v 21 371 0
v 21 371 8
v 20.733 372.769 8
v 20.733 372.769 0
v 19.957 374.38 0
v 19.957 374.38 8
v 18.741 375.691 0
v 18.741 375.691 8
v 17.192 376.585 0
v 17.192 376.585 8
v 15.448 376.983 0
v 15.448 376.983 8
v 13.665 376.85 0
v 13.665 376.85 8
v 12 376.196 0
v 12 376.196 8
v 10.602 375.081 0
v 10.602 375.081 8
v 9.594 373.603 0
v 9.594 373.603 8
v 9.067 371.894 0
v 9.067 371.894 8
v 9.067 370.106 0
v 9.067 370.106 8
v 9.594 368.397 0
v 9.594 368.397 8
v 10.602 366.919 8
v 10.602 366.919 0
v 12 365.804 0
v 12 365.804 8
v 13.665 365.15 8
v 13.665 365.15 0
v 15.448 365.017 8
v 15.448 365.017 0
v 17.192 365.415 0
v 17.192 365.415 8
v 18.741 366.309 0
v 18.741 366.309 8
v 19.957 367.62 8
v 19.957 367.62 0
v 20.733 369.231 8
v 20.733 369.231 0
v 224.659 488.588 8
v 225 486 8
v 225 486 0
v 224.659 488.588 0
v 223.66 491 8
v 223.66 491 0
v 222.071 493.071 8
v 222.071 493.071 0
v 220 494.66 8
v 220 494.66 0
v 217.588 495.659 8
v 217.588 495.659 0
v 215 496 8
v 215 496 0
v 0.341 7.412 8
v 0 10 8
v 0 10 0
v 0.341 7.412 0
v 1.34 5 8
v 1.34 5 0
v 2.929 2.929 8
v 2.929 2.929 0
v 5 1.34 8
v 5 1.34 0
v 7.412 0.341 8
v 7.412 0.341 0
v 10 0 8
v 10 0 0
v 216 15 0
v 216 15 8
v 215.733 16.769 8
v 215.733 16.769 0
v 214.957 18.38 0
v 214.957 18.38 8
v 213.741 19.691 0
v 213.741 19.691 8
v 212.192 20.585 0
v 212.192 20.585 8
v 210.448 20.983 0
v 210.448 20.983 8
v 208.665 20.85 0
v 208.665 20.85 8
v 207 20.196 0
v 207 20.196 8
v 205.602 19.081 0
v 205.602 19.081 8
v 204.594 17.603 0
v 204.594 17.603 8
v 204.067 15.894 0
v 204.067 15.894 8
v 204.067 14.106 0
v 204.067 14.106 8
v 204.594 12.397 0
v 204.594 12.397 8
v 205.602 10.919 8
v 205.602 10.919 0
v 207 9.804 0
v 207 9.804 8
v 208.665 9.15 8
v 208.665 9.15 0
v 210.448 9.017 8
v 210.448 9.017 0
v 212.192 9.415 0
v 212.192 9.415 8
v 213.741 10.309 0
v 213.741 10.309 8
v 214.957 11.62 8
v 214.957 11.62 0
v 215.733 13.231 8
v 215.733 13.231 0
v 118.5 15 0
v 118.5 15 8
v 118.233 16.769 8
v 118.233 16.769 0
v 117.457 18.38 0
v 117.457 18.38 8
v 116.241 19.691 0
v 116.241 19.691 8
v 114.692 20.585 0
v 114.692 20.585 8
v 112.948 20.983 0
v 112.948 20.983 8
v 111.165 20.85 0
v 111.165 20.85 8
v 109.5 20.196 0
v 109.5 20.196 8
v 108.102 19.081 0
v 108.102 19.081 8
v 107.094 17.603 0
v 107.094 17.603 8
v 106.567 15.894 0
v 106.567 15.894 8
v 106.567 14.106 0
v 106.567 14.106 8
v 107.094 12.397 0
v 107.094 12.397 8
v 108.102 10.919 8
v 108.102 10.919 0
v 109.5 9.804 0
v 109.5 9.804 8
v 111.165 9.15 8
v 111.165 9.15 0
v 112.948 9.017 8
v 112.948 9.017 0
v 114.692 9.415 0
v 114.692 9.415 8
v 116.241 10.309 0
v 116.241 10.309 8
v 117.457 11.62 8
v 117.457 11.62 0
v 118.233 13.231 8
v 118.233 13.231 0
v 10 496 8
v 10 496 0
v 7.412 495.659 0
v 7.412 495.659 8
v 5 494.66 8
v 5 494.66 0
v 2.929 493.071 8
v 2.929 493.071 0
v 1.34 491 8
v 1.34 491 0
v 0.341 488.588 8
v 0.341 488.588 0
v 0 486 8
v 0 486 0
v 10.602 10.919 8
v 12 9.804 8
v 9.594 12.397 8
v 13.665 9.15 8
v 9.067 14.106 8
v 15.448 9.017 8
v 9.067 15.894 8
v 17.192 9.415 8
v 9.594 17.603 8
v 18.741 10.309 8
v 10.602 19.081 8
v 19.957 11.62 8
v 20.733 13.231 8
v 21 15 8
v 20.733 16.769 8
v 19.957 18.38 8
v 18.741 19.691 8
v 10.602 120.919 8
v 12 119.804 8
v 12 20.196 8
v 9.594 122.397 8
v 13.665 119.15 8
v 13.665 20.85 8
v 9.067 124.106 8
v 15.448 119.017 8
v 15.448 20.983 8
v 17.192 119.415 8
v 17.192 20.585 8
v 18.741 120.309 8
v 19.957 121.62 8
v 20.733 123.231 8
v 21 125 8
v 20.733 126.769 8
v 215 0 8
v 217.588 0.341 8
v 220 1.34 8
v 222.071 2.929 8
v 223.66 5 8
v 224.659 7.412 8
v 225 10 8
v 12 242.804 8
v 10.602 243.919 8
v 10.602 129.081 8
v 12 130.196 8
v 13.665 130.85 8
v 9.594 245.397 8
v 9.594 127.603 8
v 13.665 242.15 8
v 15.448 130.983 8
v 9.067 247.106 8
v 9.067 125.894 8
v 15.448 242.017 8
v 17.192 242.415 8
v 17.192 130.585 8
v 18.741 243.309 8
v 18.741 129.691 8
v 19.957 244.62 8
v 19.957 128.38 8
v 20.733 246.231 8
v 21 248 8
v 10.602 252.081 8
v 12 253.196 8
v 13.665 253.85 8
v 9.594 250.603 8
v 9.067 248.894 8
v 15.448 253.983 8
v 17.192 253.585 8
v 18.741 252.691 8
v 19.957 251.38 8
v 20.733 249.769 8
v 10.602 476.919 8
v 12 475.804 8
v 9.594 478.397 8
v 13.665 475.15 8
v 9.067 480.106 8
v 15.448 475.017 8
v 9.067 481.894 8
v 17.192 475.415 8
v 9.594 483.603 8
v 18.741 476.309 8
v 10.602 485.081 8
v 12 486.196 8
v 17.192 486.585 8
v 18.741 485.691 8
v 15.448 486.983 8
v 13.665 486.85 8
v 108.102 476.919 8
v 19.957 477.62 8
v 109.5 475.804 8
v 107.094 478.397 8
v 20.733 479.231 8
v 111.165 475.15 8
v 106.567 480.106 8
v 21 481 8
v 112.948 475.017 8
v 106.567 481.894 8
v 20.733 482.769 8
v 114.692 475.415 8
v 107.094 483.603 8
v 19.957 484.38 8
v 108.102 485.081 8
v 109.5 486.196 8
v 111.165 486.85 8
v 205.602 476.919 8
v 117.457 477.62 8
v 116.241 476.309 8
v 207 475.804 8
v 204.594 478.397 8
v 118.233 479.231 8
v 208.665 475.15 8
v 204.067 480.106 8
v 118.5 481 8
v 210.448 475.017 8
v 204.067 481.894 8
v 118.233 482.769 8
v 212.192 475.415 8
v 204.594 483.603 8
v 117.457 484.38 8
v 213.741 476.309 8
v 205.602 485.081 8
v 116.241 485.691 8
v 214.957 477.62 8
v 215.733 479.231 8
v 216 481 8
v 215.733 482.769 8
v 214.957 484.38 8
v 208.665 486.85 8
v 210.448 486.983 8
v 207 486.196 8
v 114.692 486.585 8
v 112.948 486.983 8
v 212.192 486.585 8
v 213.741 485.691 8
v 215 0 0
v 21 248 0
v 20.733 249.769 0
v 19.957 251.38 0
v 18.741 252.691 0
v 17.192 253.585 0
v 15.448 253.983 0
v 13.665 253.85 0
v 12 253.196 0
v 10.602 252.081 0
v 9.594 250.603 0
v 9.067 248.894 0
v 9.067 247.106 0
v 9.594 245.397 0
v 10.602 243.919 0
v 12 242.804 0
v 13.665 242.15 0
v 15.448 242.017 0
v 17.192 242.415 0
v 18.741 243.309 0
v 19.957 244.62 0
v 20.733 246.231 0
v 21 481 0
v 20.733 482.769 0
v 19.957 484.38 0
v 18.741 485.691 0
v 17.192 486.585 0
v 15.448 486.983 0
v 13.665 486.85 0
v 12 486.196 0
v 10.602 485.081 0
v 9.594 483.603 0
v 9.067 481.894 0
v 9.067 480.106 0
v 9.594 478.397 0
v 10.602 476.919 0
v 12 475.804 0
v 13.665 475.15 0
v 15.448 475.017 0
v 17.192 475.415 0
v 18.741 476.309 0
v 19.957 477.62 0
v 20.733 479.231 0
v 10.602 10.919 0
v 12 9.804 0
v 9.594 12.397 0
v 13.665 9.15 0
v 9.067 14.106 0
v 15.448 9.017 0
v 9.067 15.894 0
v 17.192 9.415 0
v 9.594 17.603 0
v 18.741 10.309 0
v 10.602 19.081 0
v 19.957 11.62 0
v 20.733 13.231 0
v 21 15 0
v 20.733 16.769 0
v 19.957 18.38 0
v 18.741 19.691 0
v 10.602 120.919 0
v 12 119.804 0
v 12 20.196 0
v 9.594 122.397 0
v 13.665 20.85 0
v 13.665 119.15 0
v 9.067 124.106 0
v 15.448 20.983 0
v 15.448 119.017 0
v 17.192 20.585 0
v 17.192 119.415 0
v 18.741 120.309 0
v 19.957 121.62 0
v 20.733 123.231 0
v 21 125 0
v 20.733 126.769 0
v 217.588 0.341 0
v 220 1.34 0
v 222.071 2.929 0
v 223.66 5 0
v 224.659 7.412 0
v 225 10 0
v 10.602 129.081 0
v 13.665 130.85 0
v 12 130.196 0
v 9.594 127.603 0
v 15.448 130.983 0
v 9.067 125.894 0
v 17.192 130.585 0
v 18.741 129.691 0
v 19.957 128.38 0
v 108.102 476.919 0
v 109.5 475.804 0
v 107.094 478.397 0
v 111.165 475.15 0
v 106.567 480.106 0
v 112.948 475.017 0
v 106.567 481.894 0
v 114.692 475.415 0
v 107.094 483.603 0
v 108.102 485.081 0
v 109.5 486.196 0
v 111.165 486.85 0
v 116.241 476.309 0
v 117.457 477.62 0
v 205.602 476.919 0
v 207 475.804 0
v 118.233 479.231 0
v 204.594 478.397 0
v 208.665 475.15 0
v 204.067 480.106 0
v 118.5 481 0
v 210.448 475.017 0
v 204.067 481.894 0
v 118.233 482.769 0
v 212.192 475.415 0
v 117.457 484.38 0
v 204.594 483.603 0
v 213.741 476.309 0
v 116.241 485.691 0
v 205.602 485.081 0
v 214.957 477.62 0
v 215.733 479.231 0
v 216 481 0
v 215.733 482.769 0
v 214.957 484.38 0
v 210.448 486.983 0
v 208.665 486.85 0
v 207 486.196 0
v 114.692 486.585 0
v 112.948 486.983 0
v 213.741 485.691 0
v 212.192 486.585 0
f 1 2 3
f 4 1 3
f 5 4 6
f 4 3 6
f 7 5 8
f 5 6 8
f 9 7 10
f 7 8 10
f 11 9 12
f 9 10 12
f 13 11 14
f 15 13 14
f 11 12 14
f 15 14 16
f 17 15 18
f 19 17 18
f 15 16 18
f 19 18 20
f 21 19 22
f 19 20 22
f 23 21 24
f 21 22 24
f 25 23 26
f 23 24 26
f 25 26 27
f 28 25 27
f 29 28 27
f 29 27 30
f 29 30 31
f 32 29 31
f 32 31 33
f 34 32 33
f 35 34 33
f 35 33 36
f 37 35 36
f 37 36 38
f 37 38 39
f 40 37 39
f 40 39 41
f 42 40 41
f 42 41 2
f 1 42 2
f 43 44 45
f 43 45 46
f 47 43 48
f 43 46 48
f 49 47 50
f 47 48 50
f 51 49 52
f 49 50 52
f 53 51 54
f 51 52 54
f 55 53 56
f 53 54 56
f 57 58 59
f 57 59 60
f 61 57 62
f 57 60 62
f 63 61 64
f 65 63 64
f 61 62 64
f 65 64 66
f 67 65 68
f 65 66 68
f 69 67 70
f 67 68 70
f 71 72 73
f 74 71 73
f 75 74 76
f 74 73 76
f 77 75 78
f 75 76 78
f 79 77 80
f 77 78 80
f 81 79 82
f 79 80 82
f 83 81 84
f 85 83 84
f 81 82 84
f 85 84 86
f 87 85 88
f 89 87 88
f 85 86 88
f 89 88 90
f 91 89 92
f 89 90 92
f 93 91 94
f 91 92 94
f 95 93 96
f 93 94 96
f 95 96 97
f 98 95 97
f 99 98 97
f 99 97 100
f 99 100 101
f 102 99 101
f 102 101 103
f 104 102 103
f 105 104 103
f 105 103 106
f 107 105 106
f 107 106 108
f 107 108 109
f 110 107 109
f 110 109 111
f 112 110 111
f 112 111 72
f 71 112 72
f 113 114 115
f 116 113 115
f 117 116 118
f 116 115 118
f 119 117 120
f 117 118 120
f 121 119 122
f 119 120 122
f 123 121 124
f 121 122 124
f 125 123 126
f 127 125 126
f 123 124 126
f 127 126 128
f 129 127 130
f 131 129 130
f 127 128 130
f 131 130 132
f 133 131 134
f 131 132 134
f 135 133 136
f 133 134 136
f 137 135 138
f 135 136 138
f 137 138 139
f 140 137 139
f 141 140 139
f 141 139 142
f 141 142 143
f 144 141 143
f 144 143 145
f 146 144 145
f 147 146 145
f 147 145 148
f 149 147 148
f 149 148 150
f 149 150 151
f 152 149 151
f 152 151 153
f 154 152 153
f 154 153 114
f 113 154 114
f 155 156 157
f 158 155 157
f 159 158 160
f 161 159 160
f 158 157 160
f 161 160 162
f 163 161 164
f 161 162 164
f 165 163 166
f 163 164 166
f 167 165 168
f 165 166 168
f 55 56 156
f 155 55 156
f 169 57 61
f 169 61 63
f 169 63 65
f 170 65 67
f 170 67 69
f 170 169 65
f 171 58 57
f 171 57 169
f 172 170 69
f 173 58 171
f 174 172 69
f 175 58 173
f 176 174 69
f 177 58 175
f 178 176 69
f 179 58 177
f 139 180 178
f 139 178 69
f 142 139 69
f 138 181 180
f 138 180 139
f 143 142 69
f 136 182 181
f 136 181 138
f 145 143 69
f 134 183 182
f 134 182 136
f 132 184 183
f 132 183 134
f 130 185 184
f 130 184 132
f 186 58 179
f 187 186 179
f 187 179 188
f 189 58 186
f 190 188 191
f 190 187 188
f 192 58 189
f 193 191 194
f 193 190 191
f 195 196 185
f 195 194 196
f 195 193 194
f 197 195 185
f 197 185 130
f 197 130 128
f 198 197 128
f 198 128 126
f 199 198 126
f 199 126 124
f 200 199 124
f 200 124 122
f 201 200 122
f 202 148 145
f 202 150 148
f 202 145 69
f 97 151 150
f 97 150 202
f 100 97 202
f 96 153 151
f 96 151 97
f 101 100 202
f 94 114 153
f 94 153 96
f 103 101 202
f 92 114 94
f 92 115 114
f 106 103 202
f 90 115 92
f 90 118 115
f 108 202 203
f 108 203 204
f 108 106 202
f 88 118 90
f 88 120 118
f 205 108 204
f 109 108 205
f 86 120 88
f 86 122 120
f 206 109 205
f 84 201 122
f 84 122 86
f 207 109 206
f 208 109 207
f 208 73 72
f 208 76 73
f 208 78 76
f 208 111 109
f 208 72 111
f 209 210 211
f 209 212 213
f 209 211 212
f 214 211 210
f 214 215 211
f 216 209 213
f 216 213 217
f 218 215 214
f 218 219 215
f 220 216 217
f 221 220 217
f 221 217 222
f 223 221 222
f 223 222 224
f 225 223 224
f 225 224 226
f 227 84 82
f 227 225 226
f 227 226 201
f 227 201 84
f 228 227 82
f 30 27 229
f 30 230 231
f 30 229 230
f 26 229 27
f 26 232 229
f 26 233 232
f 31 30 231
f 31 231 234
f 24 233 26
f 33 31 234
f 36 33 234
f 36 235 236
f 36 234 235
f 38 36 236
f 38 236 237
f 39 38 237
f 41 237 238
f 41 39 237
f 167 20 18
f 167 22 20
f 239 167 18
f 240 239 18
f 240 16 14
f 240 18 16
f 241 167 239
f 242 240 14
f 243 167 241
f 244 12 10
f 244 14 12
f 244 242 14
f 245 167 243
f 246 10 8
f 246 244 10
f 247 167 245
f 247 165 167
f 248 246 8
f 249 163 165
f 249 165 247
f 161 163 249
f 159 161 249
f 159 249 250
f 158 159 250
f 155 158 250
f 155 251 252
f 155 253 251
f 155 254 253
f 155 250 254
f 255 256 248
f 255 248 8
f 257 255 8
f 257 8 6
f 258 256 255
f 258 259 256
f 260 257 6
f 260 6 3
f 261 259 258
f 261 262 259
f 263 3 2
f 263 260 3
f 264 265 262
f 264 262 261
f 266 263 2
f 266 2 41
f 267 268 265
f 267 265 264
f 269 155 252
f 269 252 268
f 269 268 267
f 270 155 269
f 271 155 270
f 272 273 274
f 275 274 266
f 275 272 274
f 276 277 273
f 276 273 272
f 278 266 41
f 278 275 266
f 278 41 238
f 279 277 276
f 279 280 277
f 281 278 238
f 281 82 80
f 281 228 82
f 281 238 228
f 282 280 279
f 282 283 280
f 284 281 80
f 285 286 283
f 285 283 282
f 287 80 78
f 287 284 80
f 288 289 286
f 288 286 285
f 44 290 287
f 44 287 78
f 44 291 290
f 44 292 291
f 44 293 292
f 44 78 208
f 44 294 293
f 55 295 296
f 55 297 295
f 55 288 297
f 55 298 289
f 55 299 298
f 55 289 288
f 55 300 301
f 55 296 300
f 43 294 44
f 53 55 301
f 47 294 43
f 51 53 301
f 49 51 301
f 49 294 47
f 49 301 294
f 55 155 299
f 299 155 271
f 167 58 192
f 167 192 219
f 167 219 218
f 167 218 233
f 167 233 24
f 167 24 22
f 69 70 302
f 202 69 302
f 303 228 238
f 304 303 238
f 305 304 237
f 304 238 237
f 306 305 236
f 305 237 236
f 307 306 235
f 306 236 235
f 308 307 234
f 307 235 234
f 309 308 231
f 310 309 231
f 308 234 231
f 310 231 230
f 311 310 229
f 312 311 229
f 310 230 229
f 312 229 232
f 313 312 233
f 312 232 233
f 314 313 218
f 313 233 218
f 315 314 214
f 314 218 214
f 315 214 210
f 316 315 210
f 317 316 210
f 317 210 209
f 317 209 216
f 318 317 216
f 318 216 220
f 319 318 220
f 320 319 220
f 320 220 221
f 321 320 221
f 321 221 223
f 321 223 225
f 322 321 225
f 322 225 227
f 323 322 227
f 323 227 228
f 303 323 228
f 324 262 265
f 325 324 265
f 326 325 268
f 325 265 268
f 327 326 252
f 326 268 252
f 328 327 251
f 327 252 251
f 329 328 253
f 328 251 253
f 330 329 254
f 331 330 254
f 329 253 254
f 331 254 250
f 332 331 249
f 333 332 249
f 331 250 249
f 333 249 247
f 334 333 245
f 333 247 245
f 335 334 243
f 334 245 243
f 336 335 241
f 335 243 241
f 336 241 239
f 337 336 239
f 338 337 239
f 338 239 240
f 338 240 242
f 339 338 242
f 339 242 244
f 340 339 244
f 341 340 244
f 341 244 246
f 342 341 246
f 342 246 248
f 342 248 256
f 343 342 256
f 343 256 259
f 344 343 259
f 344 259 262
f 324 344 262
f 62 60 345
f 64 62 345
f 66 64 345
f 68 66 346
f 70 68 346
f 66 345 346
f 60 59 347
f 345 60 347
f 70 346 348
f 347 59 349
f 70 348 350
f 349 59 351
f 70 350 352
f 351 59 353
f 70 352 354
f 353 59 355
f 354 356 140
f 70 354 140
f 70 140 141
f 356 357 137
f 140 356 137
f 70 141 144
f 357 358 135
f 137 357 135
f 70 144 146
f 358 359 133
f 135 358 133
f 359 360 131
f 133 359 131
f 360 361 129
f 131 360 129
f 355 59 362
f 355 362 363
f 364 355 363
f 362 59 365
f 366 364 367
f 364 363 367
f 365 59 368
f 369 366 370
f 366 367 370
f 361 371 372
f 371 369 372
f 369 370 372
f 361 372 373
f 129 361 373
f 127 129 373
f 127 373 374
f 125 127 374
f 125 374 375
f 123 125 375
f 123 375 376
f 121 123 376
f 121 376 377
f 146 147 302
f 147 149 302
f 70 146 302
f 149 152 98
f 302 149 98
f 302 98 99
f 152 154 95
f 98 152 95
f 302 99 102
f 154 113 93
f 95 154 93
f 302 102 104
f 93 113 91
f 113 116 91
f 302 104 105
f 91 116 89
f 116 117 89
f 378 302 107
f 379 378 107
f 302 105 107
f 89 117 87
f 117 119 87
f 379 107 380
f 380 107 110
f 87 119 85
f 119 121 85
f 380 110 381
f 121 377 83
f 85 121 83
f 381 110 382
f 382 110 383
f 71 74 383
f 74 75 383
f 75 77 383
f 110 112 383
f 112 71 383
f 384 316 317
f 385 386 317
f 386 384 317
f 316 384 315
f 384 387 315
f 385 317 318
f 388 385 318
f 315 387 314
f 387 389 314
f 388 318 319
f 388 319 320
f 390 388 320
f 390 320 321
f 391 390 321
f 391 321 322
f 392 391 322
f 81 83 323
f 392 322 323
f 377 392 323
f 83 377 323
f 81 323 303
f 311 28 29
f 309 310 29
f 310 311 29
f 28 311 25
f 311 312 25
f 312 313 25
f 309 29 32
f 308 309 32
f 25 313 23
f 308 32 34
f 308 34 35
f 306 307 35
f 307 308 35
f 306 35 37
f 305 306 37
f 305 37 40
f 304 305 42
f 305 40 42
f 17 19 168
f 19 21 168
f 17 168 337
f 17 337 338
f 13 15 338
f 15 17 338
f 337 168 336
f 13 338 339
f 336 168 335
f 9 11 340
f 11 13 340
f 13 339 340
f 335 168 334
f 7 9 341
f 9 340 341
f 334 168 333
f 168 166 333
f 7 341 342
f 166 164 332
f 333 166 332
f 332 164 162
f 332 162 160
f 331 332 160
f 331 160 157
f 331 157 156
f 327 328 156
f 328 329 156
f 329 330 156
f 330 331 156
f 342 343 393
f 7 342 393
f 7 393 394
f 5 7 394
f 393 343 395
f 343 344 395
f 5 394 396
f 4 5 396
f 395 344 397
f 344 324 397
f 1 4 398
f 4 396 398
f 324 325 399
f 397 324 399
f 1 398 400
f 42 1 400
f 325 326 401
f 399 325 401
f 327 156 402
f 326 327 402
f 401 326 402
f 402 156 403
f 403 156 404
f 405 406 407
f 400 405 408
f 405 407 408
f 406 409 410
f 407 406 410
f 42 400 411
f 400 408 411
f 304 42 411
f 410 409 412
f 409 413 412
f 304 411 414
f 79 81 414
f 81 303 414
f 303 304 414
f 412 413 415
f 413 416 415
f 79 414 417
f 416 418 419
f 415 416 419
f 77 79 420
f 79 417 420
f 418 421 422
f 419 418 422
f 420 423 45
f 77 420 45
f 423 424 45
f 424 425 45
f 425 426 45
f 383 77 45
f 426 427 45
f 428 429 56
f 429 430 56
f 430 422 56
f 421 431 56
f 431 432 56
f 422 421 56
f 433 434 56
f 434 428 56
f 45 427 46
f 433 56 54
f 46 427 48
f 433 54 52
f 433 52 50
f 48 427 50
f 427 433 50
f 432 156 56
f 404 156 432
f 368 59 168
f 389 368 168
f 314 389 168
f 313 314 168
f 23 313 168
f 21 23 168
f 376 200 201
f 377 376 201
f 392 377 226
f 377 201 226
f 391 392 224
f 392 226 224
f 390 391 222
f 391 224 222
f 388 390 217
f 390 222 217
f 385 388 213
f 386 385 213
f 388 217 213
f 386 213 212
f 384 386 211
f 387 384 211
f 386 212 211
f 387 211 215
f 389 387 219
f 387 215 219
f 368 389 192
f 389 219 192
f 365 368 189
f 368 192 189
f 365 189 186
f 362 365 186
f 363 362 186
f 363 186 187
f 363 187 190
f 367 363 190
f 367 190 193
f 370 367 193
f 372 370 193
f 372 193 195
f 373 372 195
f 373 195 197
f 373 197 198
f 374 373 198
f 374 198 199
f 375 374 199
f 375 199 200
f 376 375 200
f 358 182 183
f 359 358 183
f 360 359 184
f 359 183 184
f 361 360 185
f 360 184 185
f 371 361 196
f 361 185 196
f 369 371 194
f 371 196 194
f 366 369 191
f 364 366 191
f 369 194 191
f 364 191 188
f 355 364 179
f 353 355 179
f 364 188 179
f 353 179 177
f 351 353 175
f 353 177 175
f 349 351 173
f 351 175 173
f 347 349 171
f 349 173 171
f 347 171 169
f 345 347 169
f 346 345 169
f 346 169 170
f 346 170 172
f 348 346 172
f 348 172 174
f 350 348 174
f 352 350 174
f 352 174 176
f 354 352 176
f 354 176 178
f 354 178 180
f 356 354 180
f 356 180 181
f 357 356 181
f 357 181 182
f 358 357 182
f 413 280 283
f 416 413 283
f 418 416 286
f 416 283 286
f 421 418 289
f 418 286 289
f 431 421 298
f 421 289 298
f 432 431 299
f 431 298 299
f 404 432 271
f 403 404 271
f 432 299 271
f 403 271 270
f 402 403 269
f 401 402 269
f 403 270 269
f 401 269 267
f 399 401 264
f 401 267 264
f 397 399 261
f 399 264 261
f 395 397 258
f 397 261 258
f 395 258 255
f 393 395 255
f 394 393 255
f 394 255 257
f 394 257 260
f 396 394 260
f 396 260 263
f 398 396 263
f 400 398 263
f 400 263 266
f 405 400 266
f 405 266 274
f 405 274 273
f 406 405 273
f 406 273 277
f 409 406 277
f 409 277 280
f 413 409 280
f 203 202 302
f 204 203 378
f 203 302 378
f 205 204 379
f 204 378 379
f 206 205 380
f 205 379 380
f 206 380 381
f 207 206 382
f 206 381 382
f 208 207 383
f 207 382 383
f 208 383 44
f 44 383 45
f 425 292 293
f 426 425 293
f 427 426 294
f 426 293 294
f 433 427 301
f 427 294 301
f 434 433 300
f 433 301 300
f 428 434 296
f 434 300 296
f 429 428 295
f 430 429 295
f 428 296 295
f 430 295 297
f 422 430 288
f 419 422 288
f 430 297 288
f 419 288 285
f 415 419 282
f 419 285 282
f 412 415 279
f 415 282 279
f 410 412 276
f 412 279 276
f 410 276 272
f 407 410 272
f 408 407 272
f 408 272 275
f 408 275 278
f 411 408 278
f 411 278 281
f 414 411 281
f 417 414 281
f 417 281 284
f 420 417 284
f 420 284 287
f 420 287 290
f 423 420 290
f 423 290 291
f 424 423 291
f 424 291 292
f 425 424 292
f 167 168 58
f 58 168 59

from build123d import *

# Parameters (mm, degrees)
EXTRUDE_1_DEPTH     = 8
SKETCH_2_R          = 6
CUT_EXTRUDE_1_DEPTH = 10


with BuildPart() as part:
    # 草图1 → 凸台-拉伸1 (new body)
    with BuildSketch(Plane.XY):
        with BuildLine():
            Line((10, 0), (215, 0))
            ThreePointArc((215, 0), (222.071067812, 2.928932188), (225, 10))
            Line((225, 10), (225, 486))
            ThreePointArc((225, 486), (222.071067812, 493.071067812), (215, 496))
            Line((215, 496), (10, 496))
            ThreePointArc((10, 496), (2.928932188, 493.071067812), (0, 486))
            Line((0, 486), (0, 10))
            ThreePointArc((0, 10), (2.928932188, 2.928932188), (10, 0))
        make_face()
    extrude(amount=EXTRUDE_1_DEPTH)

    # 草图2 → 切除-拉伸1 (cut)
    with BuildSketch(Plane.XY.offset(8)):
        with Locations((112.5, 481)):
            Circle(SKETCH_2_R)
        with Locations((210, 481)):
            Circle(SKETCH_2_R)
        with Locations((15, 481)):
            Circle(SKETCH_2_R)
        with Locations((15, 15)):
            Circle(SKETCH_2_R)
        with Locations((210, 15)):
            Circle(SKETCH_2_R)
        with Locations((112.5, 15)):
            Circle(SKETCH_2_R)
        with Locations((15, 248)):
            Circle(SKETCH_2_R)
        with Locations((15, 371)):
            Circle(SKETCH_2_R)
        with Locations((15, 125)):
            Circle(SKETCH_2_R)
    extrude(amount=-CUT_EXTRUDE_1_DEPTH, mode=Mode.SUBTRACT)


solid = part.part
